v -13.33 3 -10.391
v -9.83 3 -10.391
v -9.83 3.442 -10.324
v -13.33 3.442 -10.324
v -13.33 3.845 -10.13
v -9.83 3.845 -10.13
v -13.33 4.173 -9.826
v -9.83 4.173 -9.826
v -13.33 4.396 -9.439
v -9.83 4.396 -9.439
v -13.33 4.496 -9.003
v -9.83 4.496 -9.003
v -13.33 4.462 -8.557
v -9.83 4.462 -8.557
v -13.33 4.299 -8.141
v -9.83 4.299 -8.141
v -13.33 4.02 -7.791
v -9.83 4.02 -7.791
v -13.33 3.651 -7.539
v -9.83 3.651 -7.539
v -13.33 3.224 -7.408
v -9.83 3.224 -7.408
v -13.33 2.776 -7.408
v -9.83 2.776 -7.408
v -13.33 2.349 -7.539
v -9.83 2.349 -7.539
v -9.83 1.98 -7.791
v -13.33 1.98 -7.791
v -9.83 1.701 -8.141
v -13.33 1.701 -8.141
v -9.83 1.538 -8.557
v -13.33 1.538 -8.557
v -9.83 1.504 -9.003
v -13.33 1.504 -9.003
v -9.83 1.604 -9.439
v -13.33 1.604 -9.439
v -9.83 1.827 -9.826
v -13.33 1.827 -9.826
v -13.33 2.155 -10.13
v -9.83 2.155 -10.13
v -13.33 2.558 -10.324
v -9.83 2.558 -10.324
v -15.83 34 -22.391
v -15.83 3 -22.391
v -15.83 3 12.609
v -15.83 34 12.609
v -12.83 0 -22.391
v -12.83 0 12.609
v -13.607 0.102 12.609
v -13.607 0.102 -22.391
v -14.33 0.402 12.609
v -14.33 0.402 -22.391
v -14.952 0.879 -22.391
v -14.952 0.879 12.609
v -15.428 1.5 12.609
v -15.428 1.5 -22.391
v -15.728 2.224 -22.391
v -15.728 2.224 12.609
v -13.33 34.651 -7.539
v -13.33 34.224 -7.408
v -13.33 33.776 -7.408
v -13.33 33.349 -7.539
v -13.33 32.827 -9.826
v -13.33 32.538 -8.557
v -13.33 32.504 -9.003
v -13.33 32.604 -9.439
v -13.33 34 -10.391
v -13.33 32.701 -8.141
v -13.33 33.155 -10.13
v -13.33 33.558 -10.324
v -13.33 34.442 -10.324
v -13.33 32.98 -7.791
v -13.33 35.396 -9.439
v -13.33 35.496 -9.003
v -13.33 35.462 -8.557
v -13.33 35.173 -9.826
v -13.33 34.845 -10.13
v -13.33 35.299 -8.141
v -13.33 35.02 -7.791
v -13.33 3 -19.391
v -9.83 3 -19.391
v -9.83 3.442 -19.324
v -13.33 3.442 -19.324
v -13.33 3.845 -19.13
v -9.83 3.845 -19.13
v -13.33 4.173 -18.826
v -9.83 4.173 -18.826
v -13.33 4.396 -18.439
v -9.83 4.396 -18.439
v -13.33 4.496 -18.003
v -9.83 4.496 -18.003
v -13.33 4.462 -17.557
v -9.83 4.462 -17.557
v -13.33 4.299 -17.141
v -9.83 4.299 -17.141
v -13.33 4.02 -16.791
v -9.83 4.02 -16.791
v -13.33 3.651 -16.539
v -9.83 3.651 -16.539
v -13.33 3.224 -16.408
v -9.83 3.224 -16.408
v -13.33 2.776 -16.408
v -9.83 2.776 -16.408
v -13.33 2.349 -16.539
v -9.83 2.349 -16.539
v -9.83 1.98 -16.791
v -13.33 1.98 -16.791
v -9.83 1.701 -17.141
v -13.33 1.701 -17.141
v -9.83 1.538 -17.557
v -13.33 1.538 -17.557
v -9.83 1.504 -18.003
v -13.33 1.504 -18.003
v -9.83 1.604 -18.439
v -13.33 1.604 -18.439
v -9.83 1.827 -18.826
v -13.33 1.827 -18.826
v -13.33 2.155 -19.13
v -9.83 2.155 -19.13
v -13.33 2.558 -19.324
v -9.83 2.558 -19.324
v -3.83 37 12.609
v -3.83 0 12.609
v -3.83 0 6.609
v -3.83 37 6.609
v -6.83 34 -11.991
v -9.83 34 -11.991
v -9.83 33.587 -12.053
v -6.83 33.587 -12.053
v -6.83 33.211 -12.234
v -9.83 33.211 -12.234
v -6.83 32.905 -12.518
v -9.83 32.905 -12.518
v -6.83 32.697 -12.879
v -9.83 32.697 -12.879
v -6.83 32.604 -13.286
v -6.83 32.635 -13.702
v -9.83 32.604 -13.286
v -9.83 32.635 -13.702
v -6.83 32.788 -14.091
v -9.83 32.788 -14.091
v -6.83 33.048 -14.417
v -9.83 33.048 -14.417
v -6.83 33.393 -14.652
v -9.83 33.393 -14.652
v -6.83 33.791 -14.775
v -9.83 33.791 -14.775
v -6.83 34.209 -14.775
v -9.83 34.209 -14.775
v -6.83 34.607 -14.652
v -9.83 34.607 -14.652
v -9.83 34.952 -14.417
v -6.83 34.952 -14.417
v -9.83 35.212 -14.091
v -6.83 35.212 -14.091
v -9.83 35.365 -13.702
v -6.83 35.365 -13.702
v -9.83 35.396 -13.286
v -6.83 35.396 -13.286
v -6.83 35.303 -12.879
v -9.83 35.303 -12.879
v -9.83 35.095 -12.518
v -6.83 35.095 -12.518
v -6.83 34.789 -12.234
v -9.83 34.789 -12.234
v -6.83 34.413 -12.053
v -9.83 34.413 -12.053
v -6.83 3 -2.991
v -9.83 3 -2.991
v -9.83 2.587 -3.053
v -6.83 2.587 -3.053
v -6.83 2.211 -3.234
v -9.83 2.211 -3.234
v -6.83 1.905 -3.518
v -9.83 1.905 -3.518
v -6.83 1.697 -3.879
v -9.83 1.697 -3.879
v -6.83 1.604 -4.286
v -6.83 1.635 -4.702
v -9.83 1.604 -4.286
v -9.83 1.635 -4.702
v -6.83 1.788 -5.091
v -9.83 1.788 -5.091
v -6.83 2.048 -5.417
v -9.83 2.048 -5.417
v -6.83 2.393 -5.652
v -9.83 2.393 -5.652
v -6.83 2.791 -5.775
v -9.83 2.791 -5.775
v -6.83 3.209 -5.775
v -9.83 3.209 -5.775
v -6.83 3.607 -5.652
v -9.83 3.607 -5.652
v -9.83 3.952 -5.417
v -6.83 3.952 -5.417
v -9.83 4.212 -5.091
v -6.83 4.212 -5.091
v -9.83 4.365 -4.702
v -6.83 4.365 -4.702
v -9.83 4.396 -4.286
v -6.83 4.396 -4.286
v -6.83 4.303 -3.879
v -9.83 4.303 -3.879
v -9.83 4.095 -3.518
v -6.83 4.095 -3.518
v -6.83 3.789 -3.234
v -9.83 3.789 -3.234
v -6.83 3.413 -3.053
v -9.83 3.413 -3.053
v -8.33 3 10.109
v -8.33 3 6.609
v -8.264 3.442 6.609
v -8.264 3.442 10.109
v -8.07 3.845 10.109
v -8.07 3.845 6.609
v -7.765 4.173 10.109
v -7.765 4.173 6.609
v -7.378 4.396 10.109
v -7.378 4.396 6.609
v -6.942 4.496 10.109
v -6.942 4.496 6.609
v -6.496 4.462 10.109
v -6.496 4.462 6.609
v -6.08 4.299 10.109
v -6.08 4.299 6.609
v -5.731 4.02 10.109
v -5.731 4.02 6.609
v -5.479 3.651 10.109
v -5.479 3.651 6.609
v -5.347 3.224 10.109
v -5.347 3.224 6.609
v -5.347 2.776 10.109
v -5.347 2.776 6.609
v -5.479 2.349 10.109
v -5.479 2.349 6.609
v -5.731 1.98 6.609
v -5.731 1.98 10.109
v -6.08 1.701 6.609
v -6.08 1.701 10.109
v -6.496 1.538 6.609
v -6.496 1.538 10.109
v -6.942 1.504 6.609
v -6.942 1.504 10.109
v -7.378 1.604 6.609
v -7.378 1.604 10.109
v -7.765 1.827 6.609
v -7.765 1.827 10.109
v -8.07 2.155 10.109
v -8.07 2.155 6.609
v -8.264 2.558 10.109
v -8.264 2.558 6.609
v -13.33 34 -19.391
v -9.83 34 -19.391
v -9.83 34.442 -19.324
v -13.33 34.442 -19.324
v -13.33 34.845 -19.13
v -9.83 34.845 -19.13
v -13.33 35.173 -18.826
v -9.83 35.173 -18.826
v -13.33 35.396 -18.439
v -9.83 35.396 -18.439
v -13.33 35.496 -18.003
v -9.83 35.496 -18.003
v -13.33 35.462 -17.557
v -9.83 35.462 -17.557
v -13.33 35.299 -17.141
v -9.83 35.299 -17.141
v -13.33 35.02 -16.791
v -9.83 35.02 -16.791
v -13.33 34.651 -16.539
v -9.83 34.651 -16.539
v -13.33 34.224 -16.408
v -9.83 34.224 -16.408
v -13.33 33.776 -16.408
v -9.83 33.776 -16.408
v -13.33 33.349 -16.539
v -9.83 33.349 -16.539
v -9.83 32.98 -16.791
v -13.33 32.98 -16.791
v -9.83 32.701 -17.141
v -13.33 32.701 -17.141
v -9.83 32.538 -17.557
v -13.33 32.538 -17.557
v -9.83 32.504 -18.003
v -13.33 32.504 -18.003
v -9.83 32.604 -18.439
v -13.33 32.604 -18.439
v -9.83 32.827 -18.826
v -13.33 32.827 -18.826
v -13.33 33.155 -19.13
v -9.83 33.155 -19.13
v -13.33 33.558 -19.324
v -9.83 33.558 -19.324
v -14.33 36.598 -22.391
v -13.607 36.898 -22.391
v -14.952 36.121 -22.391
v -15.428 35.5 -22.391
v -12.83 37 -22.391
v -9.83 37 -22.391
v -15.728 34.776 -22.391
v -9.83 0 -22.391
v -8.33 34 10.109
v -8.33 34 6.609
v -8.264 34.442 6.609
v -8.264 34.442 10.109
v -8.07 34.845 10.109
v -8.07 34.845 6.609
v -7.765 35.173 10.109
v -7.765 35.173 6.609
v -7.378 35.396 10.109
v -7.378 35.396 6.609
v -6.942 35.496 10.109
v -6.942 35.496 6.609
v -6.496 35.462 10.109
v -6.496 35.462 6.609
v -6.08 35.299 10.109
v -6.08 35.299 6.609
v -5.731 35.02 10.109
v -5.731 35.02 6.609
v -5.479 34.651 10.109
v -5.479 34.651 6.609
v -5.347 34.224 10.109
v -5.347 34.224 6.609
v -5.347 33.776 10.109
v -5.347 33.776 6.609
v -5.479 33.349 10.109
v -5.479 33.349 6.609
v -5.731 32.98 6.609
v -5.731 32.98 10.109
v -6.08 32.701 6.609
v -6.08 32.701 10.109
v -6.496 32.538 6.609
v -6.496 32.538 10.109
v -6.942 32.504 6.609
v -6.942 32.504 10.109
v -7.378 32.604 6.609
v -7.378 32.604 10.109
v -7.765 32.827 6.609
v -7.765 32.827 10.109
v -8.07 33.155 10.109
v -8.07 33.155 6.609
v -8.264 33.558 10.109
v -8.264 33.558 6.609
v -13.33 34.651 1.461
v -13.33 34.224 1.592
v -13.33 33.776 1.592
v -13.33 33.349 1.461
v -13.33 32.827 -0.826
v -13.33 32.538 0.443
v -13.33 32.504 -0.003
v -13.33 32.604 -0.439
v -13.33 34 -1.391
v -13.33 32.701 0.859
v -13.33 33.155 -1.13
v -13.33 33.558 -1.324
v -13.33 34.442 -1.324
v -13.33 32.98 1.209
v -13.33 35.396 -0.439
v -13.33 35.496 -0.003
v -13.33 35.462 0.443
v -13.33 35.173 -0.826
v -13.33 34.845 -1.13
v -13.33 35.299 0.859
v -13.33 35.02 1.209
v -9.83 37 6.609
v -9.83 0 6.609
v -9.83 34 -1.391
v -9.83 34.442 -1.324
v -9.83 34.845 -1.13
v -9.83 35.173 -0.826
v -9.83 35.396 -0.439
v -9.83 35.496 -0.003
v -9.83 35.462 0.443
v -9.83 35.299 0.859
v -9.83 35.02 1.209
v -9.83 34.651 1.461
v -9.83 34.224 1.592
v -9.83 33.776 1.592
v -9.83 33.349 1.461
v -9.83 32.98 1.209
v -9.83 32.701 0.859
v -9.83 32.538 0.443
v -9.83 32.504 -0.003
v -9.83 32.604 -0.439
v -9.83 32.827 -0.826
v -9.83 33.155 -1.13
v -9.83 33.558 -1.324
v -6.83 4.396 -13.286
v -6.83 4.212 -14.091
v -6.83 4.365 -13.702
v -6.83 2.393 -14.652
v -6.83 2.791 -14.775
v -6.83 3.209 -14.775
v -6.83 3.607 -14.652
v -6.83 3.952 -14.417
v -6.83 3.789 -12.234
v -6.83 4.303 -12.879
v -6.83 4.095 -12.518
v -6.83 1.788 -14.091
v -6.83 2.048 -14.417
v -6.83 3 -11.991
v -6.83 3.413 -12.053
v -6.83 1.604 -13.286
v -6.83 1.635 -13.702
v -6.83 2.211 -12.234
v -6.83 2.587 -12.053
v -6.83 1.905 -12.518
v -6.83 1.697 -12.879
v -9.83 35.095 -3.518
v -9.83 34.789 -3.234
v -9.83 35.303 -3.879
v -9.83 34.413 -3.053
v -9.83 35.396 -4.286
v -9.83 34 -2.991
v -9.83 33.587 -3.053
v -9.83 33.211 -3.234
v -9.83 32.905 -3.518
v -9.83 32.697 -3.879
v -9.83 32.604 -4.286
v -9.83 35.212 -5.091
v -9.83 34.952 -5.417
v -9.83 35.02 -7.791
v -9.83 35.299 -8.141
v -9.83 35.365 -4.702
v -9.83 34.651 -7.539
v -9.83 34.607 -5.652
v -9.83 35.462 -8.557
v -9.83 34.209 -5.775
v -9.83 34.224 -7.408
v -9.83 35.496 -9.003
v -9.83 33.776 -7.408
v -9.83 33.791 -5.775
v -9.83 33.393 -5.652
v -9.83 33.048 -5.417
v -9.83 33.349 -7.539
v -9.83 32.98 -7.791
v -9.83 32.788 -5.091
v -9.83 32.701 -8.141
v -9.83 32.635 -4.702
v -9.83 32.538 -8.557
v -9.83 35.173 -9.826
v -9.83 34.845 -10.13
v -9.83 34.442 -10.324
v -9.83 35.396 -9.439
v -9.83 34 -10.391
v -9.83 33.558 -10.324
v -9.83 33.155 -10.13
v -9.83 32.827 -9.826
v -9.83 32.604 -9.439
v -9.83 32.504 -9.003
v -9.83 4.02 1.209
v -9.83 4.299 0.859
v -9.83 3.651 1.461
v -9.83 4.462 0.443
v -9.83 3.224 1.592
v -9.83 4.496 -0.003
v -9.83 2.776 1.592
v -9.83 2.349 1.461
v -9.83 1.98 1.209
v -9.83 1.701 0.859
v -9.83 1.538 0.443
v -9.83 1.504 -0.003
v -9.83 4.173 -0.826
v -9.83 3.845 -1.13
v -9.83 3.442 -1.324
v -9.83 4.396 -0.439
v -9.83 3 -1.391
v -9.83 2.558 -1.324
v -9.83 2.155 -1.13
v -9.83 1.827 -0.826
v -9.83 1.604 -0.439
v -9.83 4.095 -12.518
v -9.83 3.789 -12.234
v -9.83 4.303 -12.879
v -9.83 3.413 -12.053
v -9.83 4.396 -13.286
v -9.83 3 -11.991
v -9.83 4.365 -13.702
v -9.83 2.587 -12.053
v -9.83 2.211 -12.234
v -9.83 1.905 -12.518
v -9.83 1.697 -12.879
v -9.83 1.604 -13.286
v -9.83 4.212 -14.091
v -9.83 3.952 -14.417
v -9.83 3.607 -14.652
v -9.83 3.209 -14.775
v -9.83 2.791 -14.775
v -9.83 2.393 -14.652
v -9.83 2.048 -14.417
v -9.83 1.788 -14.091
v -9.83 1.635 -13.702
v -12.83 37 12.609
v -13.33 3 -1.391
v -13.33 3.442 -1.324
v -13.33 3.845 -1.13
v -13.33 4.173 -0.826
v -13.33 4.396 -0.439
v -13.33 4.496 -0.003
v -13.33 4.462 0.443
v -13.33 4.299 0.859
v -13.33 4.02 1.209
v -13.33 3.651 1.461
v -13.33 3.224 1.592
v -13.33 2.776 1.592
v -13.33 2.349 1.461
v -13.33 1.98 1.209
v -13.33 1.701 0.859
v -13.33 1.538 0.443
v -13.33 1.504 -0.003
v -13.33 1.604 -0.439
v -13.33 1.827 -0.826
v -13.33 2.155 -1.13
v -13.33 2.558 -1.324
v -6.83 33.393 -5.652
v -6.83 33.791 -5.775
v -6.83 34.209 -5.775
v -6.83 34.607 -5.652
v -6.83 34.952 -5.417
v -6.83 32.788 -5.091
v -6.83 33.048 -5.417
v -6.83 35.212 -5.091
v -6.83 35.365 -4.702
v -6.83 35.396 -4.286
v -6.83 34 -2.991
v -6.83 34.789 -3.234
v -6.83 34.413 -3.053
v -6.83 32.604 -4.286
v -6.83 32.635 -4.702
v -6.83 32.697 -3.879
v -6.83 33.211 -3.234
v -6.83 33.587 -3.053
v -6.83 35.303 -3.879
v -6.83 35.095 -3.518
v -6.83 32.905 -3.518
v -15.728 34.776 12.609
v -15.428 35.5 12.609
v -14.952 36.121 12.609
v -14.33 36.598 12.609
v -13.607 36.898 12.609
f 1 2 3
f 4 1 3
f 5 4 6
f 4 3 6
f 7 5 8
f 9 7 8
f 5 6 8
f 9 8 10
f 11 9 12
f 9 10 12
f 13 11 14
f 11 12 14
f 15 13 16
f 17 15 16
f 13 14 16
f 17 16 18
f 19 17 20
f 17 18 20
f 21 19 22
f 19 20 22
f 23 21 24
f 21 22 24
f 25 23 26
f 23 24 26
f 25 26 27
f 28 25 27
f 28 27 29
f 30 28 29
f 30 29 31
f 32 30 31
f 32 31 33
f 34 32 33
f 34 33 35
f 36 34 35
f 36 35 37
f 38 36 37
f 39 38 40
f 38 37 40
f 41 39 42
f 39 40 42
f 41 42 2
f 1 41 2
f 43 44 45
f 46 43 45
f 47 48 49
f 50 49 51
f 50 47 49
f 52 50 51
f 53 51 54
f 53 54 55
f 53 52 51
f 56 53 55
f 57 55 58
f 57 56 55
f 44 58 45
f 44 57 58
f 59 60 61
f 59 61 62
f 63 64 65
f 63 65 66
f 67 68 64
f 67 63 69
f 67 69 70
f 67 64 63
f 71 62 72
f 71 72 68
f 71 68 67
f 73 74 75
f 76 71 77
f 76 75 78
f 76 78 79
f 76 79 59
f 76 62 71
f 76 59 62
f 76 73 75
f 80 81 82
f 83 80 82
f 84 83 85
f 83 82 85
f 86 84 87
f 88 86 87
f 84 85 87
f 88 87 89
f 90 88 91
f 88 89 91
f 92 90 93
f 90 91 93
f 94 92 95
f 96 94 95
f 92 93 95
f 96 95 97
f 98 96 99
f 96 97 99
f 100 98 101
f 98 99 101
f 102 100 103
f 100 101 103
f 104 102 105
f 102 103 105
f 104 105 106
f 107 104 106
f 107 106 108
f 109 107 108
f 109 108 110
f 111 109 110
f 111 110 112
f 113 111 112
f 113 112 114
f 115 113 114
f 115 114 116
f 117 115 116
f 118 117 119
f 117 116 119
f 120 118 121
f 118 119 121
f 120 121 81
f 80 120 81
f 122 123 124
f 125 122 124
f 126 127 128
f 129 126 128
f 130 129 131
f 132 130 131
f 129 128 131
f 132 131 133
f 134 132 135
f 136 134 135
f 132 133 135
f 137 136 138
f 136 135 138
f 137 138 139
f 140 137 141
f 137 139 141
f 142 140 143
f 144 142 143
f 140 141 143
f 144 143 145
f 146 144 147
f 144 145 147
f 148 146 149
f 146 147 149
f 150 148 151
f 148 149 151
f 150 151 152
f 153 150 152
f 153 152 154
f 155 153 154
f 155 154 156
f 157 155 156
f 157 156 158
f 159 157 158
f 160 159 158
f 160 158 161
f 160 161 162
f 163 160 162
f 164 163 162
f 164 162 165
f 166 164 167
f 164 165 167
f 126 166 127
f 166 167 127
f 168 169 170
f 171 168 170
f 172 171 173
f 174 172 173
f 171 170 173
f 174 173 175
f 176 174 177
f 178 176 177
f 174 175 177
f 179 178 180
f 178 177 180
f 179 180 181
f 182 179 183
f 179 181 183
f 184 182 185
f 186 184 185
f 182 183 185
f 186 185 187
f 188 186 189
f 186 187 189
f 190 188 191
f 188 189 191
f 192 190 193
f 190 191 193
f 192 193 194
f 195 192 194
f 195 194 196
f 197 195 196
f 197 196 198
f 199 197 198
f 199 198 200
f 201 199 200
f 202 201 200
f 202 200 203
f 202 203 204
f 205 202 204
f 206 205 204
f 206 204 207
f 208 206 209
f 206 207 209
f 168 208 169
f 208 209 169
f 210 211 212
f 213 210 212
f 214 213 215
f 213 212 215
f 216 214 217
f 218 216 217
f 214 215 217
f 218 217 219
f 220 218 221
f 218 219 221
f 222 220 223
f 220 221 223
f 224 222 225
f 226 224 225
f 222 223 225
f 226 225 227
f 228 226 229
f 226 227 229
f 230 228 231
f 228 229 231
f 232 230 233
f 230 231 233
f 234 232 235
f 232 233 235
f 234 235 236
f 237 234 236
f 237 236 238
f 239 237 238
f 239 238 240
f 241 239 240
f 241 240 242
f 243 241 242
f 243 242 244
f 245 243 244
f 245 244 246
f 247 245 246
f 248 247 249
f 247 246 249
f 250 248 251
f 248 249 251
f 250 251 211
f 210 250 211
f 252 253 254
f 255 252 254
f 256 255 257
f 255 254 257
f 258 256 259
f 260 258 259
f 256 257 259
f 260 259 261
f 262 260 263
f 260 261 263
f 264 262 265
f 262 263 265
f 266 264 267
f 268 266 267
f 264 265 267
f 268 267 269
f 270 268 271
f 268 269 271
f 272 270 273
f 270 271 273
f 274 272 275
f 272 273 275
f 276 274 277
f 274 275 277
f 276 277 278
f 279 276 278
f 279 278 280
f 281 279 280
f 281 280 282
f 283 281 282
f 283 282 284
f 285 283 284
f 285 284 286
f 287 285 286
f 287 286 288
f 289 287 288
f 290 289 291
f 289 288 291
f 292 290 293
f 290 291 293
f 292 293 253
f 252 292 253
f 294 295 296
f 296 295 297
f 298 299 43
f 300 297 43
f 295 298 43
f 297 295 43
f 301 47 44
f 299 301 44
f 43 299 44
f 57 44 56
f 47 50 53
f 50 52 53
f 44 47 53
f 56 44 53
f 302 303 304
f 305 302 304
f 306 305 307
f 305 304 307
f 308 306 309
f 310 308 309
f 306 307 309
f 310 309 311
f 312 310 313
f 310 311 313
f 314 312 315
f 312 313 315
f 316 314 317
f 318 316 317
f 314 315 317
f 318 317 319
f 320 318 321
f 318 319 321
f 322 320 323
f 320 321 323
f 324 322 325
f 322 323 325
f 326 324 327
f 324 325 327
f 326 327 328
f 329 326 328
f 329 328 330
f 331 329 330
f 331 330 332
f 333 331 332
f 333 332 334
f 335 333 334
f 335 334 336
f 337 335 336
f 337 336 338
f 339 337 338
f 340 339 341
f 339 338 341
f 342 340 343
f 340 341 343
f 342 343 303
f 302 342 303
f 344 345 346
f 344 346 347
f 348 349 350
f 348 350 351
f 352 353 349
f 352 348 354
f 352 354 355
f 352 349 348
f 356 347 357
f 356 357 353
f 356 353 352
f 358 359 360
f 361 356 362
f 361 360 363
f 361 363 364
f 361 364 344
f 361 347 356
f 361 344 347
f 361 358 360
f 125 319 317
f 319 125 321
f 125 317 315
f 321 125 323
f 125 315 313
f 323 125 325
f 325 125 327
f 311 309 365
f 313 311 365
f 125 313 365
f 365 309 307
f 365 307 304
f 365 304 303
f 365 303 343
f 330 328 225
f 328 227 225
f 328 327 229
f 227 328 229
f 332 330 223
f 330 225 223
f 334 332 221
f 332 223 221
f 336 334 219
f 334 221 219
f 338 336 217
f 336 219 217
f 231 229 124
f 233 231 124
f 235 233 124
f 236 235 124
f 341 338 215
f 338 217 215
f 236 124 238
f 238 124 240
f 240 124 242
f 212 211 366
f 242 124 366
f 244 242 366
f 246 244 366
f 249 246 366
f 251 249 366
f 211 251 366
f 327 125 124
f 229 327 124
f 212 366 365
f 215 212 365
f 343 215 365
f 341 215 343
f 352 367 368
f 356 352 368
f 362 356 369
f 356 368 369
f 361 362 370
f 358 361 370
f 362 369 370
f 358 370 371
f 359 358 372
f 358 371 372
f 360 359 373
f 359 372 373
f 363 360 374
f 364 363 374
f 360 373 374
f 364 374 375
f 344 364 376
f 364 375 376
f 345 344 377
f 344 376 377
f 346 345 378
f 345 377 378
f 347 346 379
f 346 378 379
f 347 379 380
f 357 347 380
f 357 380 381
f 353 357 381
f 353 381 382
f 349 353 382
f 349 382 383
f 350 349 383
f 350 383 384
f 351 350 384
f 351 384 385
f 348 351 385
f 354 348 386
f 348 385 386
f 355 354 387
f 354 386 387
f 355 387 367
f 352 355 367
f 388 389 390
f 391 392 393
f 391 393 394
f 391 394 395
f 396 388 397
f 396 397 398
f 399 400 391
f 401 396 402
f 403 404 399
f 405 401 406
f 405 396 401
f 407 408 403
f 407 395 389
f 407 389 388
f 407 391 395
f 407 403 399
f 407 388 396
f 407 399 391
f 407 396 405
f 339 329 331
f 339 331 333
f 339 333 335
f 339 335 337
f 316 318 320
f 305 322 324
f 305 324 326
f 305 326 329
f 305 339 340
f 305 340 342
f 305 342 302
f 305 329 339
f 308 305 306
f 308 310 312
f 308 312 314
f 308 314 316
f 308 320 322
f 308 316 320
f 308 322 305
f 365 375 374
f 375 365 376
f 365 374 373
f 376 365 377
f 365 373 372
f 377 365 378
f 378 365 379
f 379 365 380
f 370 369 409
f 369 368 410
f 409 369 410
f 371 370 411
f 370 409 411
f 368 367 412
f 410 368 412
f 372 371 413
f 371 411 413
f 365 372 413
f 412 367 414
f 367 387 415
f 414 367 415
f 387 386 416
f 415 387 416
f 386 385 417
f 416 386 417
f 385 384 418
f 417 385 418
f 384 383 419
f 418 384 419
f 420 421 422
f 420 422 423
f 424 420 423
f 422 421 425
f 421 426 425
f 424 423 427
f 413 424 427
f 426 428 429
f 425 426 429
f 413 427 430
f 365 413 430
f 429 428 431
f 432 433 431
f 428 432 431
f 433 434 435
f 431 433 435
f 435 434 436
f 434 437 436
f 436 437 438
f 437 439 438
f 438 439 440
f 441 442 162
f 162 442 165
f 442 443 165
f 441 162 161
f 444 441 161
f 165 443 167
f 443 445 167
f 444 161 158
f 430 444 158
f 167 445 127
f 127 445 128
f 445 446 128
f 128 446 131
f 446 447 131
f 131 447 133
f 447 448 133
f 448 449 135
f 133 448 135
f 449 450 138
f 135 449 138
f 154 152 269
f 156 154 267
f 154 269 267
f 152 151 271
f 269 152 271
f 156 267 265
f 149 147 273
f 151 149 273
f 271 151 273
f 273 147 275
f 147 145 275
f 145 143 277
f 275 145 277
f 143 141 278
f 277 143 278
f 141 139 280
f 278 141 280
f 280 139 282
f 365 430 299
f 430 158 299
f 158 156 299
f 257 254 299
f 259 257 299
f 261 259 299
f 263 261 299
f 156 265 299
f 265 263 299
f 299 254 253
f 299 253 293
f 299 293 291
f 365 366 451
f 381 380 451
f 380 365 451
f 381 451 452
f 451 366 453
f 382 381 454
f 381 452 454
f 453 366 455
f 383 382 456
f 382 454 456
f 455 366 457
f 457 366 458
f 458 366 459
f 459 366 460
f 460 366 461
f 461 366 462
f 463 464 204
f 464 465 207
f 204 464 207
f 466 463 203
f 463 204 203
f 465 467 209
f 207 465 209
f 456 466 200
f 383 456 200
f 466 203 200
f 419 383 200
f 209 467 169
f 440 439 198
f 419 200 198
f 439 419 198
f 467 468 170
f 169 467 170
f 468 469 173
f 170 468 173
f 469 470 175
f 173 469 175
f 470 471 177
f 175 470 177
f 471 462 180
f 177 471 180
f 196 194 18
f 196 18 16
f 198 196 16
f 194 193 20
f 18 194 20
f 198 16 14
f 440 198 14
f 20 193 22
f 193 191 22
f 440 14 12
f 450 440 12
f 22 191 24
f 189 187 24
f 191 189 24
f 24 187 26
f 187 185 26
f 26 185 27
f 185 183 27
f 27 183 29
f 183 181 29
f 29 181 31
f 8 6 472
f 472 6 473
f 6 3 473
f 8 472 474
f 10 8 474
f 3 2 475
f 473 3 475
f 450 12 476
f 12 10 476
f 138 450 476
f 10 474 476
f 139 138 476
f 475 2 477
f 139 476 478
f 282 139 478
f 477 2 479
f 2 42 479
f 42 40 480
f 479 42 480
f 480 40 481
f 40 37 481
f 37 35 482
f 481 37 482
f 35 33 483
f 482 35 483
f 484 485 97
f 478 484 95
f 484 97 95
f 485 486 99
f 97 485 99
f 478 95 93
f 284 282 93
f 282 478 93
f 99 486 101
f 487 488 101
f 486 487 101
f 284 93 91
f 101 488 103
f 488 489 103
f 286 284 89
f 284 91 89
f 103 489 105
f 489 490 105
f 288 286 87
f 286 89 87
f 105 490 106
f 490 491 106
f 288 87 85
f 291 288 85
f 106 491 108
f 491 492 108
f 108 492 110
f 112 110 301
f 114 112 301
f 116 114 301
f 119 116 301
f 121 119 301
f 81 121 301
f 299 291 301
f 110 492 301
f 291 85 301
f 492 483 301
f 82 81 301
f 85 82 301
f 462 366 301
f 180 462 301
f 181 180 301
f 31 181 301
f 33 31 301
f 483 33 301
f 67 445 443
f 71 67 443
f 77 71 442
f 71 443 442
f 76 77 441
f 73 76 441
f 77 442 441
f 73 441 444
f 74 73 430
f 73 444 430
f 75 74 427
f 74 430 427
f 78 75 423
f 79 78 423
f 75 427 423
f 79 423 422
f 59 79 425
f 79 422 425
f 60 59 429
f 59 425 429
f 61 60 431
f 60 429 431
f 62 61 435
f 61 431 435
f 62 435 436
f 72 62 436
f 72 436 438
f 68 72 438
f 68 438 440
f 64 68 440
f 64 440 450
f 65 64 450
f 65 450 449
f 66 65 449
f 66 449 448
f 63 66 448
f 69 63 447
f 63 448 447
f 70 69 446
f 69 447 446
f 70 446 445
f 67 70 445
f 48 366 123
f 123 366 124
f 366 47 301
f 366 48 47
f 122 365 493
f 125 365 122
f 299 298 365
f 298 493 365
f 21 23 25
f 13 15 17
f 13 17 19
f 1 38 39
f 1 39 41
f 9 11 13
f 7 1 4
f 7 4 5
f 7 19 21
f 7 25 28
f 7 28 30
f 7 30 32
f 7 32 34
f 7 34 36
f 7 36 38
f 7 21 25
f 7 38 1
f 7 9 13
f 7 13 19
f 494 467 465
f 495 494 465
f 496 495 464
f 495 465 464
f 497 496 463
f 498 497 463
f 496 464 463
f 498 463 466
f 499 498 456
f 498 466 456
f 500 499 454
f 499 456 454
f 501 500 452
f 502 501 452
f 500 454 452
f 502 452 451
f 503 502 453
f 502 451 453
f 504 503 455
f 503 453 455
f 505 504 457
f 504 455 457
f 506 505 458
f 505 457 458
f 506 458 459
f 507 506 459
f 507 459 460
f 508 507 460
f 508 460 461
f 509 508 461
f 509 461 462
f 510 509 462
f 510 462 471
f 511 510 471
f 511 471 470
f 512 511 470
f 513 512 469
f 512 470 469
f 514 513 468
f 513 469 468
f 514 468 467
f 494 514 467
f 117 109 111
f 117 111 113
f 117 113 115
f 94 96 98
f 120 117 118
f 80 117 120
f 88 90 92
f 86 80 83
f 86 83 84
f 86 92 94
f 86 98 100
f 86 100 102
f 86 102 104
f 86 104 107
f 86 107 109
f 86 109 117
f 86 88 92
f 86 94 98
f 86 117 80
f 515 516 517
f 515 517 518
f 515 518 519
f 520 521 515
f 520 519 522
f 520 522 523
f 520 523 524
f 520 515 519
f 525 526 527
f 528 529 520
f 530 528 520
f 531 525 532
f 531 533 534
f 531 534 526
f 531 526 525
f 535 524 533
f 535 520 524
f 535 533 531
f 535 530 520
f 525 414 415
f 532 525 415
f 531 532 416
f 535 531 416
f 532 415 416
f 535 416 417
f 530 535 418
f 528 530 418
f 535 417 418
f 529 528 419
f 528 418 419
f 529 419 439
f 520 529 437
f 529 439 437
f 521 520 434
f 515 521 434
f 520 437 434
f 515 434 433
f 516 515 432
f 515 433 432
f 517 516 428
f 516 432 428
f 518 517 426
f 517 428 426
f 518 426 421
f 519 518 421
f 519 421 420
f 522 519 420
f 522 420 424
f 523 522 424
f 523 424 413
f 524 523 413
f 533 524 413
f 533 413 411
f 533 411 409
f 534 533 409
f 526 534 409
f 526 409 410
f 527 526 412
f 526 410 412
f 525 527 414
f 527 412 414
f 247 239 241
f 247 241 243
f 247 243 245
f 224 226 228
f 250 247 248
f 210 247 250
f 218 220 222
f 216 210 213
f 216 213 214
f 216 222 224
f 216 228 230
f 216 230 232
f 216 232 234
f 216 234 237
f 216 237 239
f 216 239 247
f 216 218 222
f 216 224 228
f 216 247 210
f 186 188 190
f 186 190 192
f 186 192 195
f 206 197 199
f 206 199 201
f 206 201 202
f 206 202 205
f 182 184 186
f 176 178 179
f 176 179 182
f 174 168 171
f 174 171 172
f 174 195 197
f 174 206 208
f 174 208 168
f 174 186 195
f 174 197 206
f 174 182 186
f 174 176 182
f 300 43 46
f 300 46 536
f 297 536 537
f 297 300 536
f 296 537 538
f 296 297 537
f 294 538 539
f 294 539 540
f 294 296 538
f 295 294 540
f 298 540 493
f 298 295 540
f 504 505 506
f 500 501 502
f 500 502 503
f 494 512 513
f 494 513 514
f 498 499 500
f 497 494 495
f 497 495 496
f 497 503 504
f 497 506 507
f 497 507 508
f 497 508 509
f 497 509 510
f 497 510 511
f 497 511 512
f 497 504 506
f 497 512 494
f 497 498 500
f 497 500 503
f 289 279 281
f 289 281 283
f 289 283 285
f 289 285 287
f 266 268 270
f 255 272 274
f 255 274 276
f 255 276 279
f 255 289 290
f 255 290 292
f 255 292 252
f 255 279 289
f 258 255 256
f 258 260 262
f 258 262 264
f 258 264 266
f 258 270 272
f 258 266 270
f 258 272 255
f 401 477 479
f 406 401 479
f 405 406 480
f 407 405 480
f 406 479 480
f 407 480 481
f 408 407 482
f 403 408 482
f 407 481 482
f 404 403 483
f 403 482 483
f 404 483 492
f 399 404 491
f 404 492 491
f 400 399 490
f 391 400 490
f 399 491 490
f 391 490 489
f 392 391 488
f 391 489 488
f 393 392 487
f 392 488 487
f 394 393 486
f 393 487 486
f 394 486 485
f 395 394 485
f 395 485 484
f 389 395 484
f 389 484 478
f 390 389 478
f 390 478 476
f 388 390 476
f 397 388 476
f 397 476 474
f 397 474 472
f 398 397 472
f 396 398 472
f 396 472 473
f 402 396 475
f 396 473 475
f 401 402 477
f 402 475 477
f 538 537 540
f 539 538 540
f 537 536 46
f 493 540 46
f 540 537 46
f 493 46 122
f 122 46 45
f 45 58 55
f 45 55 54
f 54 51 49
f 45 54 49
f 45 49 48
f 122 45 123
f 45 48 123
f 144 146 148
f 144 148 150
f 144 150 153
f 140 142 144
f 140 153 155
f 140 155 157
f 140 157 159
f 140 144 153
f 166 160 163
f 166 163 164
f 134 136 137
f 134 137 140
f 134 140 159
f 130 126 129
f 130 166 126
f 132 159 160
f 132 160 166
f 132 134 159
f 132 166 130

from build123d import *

# Parameters (mm, degrees)
BOSS_EXTRUDE3_DEPTH = 37
SKETCH7_OUTSIDE_W   = 24.466
SKETCH7_OUTSIDE_H   = 49.466
CUT_EXTRUDE4_DEPTH  = 37
SKETCH8_R           = 1.5
CUT_EXTRUDE5_DEPTH  = 3.5
SKETCH9_R           = 1.5
CUT_EXTRUDE6_DEPTH  = 3.5
SKETCH10_R          = 1.4
BOSS_EXTRUDE4_DEPTH = 3


with BuildPart() as part:
    # Sketch1 → Boss-Extrude3 (new body)
    with BuildSketch(Plane(origin=(0, 0, 0), x_dir=(1, 0, 0), z_dir=(0, 1, 0))):
        Polygon((-15.830224571, 22.390751722), (-15.830224571, -12.609248278), (-3.830224571, -12.609248278), (-3.830224571, -6.609248278), (-9.830224571, -6.609248278), (-9.830224571, 22.390751722), align=None)
    extrude(amount=BOSS_EXTRUDE3_DEPTH)

    # Sketch7 outside → Cut-Extrude4 (cut)
    with BuildSketch(Plane(origin=(0, 0, -22.390751722), x_dir=(-1, 0, 0), z_dir=(0, 0, -1))):
        with Locations((9.83, 18.5)):
            Rectangle(SKETCH7_OUTSIDE_W, SKETCH7_OUTSIDE_H)
        with BuildLine():
            Line((12.830224571, 37), (-5.541662032, 37))
            Line((-5.541662032, 37), (-5.541662032, 0))
            Line((-5.541662032, 0), (12.830224571, 0))
            ThreePointArc((12.830224571, 0), (14.951544915, 0.878679656), (15.830224571, 3))
            Line((15.830224571, 3), (15.830224571, 34))
            ThreePointArc((15.830224571, 34), (14.951544915, 36.121320344), (12.830224571, 37))
        make_face(mode=Mode.SUBTRACT)
    extrude(amount=-CUT_EXTRUDE4_DEPTH, mode=Mode.SUBTRACT)

    # Sketch8 → Cut-Extrude5 (cut)
    with BuildSketch(Plane(origin=(-9.830224571, 0, 0), x_dir=(0, 0, -1), z_dir=(1, 0, 0))):
        with Locations((-0.109248278, 34)):
            Circle(SKETCH8_R)
        with Locations((8.890751722, 34)):
            Circle(SKETCH8_R)
        with Locations((-0.109248278, 3)):
            Circle(SKETCH8_R)
        with Locations((8.890751722, 3)):
            Circle(SKETCH8_R)
        with Locations((17.890751722, 3)):
            Circle(SKETCH8_R)
        with Locations((17.890751722, 34)):
            Circle(SKETCH8_R)
    extrude(amount=-CUT_EXTRUDE5_DEPTH, mode=Mode.SUBTRACT)

    # Sketch9 → Cut-Extrude6 (cut)
    with BuildSketch(Plane(origin=(0, 0, 6.609248278), x_dir=(-1, 0, 0), z_dir=(0, 0, -1))):
        with Locations((6.830224571, 34)):
            Circle(SKETCH9_R)
        with Locations((6.830224571, 3)):
            Circle(SKETCH9_R)
    extrude(amount=-CUT_EXTRUDE6_DEPTH, mode=Mode.SUBTRACT)

    # Sketch10 → Boss-Extrude4 (add)
    with BuildSketch(Plane(origin=(-9.830224571, 0, 0), x_dir=(0, 0, -1), z_dir=(1, 0, 0))):
        with Locations(Location((4.390751722, 3, 0), (0, 0, 180))):
            Circle(SKETCH10_R)
        with Locations(Location((4.390751722, 34, 0), (0, 0, 180))):
            Circle(SKETCH10_R)
        with Locations(Location((13.390751722, 3, 0), (0, 0, 180))):
            Circle(SKETCH10_R)
        with Locations(Location((13.390751722, 34, 0), (0, 0, 180))):
            Circle(SKETCH10_R)
    extrude(amount=BOSS_EXTRUDE4_DEPTH)


solid = part.part
